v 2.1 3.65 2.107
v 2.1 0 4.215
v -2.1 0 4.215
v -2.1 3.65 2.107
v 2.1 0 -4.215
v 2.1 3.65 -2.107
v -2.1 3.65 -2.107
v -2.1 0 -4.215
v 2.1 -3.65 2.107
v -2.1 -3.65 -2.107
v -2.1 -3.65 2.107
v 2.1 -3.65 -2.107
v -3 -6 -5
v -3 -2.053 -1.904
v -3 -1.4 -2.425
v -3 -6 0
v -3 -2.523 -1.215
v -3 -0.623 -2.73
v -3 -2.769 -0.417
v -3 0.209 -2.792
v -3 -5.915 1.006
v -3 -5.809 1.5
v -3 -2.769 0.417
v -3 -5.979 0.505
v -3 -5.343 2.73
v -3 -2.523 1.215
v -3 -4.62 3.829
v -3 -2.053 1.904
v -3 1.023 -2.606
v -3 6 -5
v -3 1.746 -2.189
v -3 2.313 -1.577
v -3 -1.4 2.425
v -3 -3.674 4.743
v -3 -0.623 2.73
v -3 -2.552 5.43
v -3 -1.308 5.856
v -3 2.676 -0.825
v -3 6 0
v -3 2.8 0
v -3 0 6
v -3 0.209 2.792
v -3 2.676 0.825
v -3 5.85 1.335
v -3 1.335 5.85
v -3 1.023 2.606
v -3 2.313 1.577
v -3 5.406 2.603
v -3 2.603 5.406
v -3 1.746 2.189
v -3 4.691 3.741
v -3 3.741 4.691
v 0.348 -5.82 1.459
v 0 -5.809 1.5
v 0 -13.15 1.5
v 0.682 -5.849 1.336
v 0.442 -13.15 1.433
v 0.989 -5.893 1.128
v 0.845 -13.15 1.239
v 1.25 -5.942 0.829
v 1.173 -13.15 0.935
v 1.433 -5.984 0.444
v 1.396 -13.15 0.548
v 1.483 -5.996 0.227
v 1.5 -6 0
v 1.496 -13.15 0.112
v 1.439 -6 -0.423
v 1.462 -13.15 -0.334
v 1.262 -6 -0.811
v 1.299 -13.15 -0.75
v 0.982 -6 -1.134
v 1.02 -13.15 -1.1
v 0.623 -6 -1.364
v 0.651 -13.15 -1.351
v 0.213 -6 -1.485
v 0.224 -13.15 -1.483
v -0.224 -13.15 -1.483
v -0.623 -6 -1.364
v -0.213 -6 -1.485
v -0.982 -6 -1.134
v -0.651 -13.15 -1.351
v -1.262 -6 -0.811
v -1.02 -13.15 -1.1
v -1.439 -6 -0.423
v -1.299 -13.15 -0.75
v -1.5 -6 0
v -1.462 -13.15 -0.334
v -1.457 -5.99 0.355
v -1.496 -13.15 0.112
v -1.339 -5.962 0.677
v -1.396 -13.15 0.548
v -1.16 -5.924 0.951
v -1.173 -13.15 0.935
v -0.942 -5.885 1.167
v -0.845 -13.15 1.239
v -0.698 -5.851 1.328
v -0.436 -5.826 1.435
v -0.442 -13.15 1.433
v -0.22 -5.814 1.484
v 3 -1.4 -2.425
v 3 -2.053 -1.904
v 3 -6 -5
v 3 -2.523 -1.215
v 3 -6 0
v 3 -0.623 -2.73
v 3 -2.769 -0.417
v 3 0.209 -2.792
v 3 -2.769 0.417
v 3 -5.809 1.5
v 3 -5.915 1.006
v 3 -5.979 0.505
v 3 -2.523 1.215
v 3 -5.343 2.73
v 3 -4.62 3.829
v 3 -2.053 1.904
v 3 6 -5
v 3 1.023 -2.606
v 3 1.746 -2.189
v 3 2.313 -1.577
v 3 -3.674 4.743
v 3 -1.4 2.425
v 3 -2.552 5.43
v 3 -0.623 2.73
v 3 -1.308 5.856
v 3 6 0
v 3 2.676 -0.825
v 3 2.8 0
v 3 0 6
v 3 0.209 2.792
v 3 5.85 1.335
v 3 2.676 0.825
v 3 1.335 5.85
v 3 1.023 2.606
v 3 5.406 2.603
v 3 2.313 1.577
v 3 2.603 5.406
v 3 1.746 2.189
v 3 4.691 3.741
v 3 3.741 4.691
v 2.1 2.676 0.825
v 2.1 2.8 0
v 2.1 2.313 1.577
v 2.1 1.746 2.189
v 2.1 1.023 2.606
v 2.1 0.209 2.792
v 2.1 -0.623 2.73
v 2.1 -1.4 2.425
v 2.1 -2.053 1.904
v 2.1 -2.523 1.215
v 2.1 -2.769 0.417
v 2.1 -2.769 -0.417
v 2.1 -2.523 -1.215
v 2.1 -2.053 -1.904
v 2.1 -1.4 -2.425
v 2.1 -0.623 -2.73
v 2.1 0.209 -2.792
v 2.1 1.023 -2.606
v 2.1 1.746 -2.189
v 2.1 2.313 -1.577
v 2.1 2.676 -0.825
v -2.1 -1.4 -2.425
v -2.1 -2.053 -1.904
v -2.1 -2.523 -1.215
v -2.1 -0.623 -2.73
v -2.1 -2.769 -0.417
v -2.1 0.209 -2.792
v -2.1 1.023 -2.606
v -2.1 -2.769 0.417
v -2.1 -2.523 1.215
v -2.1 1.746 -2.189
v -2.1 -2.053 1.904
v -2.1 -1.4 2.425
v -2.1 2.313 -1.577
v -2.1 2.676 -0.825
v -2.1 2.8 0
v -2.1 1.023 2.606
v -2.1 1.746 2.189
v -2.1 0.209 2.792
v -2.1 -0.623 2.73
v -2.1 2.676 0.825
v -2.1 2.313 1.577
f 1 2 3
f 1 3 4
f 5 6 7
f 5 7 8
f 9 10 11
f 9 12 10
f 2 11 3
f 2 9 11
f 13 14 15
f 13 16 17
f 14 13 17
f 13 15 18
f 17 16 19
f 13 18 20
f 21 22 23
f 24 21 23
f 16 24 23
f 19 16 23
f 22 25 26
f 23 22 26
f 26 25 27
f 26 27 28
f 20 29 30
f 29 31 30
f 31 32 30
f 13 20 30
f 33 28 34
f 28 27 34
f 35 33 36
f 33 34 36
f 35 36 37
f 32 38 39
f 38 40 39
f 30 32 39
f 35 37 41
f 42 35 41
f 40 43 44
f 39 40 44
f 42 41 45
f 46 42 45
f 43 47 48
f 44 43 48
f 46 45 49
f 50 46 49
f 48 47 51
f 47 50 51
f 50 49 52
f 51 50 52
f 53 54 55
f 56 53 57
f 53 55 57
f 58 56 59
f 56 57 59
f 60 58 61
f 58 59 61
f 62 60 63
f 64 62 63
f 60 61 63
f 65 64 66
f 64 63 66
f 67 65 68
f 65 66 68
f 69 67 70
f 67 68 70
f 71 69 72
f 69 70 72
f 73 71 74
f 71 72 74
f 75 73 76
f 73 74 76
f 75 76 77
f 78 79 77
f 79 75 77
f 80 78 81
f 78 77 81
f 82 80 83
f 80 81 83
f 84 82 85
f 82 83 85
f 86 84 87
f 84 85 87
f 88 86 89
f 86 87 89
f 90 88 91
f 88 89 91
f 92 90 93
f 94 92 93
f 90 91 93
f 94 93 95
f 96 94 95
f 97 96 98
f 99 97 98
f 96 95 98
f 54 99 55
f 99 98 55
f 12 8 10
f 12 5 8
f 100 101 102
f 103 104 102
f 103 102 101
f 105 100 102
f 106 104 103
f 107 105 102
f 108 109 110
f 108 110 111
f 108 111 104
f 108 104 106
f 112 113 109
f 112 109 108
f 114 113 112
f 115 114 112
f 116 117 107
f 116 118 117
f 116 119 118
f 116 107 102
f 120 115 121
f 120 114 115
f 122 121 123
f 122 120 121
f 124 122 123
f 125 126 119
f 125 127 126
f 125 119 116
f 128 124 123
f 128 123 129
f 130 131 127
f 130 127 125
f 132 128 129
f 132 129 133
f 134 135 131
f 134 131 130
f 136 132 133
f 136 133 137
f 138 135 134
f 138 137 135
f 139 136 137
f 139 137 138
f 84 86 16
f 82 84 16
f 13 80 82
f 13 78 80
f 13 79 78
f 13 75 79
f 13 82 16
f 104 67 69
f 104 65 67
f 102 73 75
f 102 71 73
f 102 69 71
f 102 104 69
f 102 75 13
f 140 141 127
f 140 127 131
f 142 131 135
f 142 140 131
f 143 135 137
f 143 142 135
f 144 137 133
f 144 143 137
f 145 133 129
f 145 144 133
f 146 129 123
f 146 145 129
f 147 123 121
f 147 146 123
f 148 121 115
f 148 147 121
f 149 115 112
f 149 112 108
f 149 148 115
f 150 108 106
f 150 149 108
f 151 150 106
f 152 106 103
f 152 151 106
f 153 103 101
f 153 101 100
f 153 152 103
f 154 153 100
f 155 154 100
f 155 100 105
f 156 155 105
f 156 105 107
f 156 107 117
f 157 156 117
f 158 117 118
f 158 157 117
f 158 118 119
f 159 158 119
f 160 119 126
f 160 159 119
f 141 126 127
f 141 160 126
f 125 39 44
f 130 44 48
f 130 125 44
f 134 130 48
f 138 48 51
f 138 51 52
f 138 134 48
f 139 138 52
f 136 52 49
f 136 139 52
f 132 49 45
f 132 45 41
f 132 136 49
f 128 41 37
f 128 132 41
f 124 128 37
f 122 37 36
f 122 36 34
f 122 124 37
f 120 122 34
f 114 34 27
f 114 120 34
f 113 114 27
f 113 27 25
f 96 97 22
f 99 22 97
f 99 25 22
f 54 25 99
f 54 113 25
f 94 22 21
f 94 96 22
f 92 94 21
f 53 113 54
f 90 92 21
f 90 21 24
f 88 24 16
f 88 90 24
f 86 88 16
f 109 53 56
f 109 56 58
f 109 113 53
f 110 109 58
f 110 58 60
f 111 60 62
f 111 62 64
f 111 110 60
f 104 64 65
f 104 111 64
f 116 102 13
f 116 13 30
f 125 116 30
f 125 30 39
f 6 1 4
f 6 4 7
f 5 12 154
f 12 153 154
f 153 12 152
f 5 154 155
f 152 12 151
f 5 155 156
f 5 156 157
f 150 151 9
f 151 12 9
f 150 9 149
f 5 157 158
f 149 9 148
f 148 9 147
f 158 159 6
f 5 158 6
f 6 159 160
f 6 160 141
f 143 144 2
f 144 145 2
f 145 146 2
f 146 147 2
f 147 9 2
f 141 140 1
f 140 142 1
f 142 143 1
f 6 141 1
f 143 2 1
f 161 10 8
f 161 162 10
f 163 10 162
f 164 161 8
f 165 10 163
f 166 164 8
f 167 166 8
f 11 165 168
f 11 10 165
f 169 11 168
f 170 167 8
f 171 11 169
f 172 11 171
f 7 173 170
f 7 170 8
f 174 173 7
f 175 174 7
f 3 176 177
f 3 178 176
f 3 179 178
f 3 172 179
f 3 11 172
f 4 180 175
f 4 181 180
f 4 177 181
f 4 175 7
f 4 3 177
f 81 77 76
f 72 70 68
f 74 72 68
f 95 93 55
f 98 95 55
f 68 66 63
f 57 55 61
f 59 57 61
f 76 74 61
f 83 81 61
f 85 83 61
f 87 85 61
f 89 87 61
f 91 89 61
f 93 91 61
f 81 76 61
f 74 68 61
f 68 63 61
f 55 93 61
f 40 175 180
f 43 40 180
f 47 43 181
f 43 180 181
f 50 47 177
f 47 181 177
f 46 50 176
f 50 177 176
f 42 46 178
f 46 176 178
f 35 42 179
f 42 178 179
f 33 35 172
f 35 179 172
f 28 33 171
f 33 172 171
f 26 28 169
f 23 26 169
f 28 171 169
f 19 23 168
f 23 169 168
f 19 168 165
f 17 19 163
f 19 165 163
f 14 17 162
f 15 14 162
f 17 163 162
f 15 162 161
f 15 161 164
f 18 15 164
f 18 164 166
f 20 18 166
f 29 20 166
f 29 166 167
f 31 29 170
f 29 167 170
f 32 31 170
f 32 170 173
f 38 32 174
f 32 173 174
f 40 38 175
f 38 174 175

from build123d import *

# Parameters (mm, degrees)
F0_W     = 2.35
F0_H     = 1.5
F1_DEPTH = 2.1
F2_START = -2.1
F0_R     = 2.8
F2_DEPTH = 0.9


with BuildPart() as f1:
    # F0 (on Right) → F1 (new body, symmetric)
    with BuildSketch(Plane.YZ):
        with BuildLine():
            Line((-3.65, 1.5), (-3.65, 2.1073284825))
            Line((-3.65, 2.1073284825), (0, 4.2146569651))
            Line((0, 4.2146569651), (3.65, 2.1073284825))
            Line((3.65, 2.1073284825), (3.65, -2.1073284825))
            Line((3.65, -2.1073284825), (0, -4.2146569651))
            Line((0, -4.2146569651), (-3.65, -2.1073284825))
            Line((-3.65, -2.1073284825), (-3.65, -1.5))
            Line((-3.65, -1.5), (-6, -1.5))
            Line((-6, -1.5), (-6, -5))
            Line((-6, -5), (6, -5))
            Line((6, -5), (6, 0))
            ThreePointArc((6, 0), (4.2426406871, 4.2426406871), (0, 6))
            ThreePointArc((0, 6), (-3.6742346142, 4.7434164903), (-5.8094750193, 1.5))
            Line((-5.8094750193, 1.5), (-3.65, 1.5))
        make_face()
        with Locations((-4.825, -0.75)):
            Rectangle(F0_W, F0_H)
        with BuildLine():
            Line((-3.65, 0), (-3.65, 1.5))
            Line((-3.65, 1.5), (-5.8094750193, 1.5))
            ThreePointArc((-5.8094750193, 1.5), (-5.9521781776, 0.7560257549), (-6, 0))
            Line((-6, 0), (-3.65, 0))
        make_face()
    extrude(amount=F1_DEPTH, both=True)

    # F0 (on Right) → F2 (join)
    with BuildSketch(Plane.YZ.offset(F2_START)):
        with BuildLine():
            Line((-3.65, 0), (-3.65, 1.5))
            Line((-3.65, 1.5), (-5.8094750193, 1.5))
            ThreePointArc((-5.8094750193, 1.5), (-5.9521781776, 0.7560257549), (-6, 0))
            Line((-6, 0), (-3.65, 0))
        make_face()
        with Locations((-4.825, -0.75)):
            Rectangle(F0_W, F0_H)
        with BuildLine():
            Line((-3.65, 1.5), (-3.65, 2.1073284825))
            Line((-3.65, 2.1073284825), (0, 4.2146569651))
            Line((0, 4.2146569651), (3.65, 2.1073284825))
            Line((3.65, 2.1073284825), (3.65, -2.1073284825))
            Line((3.65, -2.1073284825), (0, -4.2146569651))
            Line((0, -4.2146569651), (-3.65, -2.1073284825))
            Line((-3.65, -2.1073284825), (-3.65, -1.5))
            Line((-3.65, -1.5), (-6, -1.5))
            Line((-6, -1.5), (-6, -5))
            Line((-6, -5), (6, -5))
            Line((6, -5), (6, 0))
            ThreePointArc((6, 0), (4.2426406871, 4.2426406871), (0, 6))
            ThreePointArc((0, 6), (-3.6742346142, 4.7434164903), (-5.8094750193, 1.5))
            Line((-5.8094750193, 1.5), (-3.65, 1.5))
        make_face()
        Polygon((0, 4.2146569651), (-3.65, 2.1073284825), (-3.65, 1.5), (-3.65, 0), (-3.65, -1.5), (-3.65, -2.1073284825), (0, -4.2146569651), (3.65, -2.1073284825), (3.65, 2.1073284825), align=None)
        Circle(F0_R, mode=Mode.SUBTRACT)
    extrude(amount=-F2_DEPTH)

    # F0 (on Right) → F3 (revolve)
    with BuildSketch(Plane.YZ):
        with BuildLine():
            ThreePointArc((-6, 0), (-5.9521781776, 0.7560257549), (-5.8094750193, 1.5))
            Line((-5.8094750193, 1.5), (-13.15, 1.5))
            Line((-13.15, 1.5), (-13.15, 0))
            Line((-13.15, 0), (-6, 0))
        make_face()
        with BuildLine():
            Line((-3.65, 0), (-3.65, 1.5))
            Line((-3.65, 1.5), (-5.8094750193, 1.5))
            ThreePointArc((-5.8094750193, 1.5), (-5.9521781776, 0.7560257549), (-6, 0))
            Line((-6, 0), (-3.65, 0))
        make_face()
    revolve(axis=Axis((0, -8.4, 0), (0, 1, 0)))

    # F4: F1 across plane


with BuildPart() as f1_1:
    add(f1.part)
    add(f1.part.mirror(Plane.YZ))


solid = f1_1.part
